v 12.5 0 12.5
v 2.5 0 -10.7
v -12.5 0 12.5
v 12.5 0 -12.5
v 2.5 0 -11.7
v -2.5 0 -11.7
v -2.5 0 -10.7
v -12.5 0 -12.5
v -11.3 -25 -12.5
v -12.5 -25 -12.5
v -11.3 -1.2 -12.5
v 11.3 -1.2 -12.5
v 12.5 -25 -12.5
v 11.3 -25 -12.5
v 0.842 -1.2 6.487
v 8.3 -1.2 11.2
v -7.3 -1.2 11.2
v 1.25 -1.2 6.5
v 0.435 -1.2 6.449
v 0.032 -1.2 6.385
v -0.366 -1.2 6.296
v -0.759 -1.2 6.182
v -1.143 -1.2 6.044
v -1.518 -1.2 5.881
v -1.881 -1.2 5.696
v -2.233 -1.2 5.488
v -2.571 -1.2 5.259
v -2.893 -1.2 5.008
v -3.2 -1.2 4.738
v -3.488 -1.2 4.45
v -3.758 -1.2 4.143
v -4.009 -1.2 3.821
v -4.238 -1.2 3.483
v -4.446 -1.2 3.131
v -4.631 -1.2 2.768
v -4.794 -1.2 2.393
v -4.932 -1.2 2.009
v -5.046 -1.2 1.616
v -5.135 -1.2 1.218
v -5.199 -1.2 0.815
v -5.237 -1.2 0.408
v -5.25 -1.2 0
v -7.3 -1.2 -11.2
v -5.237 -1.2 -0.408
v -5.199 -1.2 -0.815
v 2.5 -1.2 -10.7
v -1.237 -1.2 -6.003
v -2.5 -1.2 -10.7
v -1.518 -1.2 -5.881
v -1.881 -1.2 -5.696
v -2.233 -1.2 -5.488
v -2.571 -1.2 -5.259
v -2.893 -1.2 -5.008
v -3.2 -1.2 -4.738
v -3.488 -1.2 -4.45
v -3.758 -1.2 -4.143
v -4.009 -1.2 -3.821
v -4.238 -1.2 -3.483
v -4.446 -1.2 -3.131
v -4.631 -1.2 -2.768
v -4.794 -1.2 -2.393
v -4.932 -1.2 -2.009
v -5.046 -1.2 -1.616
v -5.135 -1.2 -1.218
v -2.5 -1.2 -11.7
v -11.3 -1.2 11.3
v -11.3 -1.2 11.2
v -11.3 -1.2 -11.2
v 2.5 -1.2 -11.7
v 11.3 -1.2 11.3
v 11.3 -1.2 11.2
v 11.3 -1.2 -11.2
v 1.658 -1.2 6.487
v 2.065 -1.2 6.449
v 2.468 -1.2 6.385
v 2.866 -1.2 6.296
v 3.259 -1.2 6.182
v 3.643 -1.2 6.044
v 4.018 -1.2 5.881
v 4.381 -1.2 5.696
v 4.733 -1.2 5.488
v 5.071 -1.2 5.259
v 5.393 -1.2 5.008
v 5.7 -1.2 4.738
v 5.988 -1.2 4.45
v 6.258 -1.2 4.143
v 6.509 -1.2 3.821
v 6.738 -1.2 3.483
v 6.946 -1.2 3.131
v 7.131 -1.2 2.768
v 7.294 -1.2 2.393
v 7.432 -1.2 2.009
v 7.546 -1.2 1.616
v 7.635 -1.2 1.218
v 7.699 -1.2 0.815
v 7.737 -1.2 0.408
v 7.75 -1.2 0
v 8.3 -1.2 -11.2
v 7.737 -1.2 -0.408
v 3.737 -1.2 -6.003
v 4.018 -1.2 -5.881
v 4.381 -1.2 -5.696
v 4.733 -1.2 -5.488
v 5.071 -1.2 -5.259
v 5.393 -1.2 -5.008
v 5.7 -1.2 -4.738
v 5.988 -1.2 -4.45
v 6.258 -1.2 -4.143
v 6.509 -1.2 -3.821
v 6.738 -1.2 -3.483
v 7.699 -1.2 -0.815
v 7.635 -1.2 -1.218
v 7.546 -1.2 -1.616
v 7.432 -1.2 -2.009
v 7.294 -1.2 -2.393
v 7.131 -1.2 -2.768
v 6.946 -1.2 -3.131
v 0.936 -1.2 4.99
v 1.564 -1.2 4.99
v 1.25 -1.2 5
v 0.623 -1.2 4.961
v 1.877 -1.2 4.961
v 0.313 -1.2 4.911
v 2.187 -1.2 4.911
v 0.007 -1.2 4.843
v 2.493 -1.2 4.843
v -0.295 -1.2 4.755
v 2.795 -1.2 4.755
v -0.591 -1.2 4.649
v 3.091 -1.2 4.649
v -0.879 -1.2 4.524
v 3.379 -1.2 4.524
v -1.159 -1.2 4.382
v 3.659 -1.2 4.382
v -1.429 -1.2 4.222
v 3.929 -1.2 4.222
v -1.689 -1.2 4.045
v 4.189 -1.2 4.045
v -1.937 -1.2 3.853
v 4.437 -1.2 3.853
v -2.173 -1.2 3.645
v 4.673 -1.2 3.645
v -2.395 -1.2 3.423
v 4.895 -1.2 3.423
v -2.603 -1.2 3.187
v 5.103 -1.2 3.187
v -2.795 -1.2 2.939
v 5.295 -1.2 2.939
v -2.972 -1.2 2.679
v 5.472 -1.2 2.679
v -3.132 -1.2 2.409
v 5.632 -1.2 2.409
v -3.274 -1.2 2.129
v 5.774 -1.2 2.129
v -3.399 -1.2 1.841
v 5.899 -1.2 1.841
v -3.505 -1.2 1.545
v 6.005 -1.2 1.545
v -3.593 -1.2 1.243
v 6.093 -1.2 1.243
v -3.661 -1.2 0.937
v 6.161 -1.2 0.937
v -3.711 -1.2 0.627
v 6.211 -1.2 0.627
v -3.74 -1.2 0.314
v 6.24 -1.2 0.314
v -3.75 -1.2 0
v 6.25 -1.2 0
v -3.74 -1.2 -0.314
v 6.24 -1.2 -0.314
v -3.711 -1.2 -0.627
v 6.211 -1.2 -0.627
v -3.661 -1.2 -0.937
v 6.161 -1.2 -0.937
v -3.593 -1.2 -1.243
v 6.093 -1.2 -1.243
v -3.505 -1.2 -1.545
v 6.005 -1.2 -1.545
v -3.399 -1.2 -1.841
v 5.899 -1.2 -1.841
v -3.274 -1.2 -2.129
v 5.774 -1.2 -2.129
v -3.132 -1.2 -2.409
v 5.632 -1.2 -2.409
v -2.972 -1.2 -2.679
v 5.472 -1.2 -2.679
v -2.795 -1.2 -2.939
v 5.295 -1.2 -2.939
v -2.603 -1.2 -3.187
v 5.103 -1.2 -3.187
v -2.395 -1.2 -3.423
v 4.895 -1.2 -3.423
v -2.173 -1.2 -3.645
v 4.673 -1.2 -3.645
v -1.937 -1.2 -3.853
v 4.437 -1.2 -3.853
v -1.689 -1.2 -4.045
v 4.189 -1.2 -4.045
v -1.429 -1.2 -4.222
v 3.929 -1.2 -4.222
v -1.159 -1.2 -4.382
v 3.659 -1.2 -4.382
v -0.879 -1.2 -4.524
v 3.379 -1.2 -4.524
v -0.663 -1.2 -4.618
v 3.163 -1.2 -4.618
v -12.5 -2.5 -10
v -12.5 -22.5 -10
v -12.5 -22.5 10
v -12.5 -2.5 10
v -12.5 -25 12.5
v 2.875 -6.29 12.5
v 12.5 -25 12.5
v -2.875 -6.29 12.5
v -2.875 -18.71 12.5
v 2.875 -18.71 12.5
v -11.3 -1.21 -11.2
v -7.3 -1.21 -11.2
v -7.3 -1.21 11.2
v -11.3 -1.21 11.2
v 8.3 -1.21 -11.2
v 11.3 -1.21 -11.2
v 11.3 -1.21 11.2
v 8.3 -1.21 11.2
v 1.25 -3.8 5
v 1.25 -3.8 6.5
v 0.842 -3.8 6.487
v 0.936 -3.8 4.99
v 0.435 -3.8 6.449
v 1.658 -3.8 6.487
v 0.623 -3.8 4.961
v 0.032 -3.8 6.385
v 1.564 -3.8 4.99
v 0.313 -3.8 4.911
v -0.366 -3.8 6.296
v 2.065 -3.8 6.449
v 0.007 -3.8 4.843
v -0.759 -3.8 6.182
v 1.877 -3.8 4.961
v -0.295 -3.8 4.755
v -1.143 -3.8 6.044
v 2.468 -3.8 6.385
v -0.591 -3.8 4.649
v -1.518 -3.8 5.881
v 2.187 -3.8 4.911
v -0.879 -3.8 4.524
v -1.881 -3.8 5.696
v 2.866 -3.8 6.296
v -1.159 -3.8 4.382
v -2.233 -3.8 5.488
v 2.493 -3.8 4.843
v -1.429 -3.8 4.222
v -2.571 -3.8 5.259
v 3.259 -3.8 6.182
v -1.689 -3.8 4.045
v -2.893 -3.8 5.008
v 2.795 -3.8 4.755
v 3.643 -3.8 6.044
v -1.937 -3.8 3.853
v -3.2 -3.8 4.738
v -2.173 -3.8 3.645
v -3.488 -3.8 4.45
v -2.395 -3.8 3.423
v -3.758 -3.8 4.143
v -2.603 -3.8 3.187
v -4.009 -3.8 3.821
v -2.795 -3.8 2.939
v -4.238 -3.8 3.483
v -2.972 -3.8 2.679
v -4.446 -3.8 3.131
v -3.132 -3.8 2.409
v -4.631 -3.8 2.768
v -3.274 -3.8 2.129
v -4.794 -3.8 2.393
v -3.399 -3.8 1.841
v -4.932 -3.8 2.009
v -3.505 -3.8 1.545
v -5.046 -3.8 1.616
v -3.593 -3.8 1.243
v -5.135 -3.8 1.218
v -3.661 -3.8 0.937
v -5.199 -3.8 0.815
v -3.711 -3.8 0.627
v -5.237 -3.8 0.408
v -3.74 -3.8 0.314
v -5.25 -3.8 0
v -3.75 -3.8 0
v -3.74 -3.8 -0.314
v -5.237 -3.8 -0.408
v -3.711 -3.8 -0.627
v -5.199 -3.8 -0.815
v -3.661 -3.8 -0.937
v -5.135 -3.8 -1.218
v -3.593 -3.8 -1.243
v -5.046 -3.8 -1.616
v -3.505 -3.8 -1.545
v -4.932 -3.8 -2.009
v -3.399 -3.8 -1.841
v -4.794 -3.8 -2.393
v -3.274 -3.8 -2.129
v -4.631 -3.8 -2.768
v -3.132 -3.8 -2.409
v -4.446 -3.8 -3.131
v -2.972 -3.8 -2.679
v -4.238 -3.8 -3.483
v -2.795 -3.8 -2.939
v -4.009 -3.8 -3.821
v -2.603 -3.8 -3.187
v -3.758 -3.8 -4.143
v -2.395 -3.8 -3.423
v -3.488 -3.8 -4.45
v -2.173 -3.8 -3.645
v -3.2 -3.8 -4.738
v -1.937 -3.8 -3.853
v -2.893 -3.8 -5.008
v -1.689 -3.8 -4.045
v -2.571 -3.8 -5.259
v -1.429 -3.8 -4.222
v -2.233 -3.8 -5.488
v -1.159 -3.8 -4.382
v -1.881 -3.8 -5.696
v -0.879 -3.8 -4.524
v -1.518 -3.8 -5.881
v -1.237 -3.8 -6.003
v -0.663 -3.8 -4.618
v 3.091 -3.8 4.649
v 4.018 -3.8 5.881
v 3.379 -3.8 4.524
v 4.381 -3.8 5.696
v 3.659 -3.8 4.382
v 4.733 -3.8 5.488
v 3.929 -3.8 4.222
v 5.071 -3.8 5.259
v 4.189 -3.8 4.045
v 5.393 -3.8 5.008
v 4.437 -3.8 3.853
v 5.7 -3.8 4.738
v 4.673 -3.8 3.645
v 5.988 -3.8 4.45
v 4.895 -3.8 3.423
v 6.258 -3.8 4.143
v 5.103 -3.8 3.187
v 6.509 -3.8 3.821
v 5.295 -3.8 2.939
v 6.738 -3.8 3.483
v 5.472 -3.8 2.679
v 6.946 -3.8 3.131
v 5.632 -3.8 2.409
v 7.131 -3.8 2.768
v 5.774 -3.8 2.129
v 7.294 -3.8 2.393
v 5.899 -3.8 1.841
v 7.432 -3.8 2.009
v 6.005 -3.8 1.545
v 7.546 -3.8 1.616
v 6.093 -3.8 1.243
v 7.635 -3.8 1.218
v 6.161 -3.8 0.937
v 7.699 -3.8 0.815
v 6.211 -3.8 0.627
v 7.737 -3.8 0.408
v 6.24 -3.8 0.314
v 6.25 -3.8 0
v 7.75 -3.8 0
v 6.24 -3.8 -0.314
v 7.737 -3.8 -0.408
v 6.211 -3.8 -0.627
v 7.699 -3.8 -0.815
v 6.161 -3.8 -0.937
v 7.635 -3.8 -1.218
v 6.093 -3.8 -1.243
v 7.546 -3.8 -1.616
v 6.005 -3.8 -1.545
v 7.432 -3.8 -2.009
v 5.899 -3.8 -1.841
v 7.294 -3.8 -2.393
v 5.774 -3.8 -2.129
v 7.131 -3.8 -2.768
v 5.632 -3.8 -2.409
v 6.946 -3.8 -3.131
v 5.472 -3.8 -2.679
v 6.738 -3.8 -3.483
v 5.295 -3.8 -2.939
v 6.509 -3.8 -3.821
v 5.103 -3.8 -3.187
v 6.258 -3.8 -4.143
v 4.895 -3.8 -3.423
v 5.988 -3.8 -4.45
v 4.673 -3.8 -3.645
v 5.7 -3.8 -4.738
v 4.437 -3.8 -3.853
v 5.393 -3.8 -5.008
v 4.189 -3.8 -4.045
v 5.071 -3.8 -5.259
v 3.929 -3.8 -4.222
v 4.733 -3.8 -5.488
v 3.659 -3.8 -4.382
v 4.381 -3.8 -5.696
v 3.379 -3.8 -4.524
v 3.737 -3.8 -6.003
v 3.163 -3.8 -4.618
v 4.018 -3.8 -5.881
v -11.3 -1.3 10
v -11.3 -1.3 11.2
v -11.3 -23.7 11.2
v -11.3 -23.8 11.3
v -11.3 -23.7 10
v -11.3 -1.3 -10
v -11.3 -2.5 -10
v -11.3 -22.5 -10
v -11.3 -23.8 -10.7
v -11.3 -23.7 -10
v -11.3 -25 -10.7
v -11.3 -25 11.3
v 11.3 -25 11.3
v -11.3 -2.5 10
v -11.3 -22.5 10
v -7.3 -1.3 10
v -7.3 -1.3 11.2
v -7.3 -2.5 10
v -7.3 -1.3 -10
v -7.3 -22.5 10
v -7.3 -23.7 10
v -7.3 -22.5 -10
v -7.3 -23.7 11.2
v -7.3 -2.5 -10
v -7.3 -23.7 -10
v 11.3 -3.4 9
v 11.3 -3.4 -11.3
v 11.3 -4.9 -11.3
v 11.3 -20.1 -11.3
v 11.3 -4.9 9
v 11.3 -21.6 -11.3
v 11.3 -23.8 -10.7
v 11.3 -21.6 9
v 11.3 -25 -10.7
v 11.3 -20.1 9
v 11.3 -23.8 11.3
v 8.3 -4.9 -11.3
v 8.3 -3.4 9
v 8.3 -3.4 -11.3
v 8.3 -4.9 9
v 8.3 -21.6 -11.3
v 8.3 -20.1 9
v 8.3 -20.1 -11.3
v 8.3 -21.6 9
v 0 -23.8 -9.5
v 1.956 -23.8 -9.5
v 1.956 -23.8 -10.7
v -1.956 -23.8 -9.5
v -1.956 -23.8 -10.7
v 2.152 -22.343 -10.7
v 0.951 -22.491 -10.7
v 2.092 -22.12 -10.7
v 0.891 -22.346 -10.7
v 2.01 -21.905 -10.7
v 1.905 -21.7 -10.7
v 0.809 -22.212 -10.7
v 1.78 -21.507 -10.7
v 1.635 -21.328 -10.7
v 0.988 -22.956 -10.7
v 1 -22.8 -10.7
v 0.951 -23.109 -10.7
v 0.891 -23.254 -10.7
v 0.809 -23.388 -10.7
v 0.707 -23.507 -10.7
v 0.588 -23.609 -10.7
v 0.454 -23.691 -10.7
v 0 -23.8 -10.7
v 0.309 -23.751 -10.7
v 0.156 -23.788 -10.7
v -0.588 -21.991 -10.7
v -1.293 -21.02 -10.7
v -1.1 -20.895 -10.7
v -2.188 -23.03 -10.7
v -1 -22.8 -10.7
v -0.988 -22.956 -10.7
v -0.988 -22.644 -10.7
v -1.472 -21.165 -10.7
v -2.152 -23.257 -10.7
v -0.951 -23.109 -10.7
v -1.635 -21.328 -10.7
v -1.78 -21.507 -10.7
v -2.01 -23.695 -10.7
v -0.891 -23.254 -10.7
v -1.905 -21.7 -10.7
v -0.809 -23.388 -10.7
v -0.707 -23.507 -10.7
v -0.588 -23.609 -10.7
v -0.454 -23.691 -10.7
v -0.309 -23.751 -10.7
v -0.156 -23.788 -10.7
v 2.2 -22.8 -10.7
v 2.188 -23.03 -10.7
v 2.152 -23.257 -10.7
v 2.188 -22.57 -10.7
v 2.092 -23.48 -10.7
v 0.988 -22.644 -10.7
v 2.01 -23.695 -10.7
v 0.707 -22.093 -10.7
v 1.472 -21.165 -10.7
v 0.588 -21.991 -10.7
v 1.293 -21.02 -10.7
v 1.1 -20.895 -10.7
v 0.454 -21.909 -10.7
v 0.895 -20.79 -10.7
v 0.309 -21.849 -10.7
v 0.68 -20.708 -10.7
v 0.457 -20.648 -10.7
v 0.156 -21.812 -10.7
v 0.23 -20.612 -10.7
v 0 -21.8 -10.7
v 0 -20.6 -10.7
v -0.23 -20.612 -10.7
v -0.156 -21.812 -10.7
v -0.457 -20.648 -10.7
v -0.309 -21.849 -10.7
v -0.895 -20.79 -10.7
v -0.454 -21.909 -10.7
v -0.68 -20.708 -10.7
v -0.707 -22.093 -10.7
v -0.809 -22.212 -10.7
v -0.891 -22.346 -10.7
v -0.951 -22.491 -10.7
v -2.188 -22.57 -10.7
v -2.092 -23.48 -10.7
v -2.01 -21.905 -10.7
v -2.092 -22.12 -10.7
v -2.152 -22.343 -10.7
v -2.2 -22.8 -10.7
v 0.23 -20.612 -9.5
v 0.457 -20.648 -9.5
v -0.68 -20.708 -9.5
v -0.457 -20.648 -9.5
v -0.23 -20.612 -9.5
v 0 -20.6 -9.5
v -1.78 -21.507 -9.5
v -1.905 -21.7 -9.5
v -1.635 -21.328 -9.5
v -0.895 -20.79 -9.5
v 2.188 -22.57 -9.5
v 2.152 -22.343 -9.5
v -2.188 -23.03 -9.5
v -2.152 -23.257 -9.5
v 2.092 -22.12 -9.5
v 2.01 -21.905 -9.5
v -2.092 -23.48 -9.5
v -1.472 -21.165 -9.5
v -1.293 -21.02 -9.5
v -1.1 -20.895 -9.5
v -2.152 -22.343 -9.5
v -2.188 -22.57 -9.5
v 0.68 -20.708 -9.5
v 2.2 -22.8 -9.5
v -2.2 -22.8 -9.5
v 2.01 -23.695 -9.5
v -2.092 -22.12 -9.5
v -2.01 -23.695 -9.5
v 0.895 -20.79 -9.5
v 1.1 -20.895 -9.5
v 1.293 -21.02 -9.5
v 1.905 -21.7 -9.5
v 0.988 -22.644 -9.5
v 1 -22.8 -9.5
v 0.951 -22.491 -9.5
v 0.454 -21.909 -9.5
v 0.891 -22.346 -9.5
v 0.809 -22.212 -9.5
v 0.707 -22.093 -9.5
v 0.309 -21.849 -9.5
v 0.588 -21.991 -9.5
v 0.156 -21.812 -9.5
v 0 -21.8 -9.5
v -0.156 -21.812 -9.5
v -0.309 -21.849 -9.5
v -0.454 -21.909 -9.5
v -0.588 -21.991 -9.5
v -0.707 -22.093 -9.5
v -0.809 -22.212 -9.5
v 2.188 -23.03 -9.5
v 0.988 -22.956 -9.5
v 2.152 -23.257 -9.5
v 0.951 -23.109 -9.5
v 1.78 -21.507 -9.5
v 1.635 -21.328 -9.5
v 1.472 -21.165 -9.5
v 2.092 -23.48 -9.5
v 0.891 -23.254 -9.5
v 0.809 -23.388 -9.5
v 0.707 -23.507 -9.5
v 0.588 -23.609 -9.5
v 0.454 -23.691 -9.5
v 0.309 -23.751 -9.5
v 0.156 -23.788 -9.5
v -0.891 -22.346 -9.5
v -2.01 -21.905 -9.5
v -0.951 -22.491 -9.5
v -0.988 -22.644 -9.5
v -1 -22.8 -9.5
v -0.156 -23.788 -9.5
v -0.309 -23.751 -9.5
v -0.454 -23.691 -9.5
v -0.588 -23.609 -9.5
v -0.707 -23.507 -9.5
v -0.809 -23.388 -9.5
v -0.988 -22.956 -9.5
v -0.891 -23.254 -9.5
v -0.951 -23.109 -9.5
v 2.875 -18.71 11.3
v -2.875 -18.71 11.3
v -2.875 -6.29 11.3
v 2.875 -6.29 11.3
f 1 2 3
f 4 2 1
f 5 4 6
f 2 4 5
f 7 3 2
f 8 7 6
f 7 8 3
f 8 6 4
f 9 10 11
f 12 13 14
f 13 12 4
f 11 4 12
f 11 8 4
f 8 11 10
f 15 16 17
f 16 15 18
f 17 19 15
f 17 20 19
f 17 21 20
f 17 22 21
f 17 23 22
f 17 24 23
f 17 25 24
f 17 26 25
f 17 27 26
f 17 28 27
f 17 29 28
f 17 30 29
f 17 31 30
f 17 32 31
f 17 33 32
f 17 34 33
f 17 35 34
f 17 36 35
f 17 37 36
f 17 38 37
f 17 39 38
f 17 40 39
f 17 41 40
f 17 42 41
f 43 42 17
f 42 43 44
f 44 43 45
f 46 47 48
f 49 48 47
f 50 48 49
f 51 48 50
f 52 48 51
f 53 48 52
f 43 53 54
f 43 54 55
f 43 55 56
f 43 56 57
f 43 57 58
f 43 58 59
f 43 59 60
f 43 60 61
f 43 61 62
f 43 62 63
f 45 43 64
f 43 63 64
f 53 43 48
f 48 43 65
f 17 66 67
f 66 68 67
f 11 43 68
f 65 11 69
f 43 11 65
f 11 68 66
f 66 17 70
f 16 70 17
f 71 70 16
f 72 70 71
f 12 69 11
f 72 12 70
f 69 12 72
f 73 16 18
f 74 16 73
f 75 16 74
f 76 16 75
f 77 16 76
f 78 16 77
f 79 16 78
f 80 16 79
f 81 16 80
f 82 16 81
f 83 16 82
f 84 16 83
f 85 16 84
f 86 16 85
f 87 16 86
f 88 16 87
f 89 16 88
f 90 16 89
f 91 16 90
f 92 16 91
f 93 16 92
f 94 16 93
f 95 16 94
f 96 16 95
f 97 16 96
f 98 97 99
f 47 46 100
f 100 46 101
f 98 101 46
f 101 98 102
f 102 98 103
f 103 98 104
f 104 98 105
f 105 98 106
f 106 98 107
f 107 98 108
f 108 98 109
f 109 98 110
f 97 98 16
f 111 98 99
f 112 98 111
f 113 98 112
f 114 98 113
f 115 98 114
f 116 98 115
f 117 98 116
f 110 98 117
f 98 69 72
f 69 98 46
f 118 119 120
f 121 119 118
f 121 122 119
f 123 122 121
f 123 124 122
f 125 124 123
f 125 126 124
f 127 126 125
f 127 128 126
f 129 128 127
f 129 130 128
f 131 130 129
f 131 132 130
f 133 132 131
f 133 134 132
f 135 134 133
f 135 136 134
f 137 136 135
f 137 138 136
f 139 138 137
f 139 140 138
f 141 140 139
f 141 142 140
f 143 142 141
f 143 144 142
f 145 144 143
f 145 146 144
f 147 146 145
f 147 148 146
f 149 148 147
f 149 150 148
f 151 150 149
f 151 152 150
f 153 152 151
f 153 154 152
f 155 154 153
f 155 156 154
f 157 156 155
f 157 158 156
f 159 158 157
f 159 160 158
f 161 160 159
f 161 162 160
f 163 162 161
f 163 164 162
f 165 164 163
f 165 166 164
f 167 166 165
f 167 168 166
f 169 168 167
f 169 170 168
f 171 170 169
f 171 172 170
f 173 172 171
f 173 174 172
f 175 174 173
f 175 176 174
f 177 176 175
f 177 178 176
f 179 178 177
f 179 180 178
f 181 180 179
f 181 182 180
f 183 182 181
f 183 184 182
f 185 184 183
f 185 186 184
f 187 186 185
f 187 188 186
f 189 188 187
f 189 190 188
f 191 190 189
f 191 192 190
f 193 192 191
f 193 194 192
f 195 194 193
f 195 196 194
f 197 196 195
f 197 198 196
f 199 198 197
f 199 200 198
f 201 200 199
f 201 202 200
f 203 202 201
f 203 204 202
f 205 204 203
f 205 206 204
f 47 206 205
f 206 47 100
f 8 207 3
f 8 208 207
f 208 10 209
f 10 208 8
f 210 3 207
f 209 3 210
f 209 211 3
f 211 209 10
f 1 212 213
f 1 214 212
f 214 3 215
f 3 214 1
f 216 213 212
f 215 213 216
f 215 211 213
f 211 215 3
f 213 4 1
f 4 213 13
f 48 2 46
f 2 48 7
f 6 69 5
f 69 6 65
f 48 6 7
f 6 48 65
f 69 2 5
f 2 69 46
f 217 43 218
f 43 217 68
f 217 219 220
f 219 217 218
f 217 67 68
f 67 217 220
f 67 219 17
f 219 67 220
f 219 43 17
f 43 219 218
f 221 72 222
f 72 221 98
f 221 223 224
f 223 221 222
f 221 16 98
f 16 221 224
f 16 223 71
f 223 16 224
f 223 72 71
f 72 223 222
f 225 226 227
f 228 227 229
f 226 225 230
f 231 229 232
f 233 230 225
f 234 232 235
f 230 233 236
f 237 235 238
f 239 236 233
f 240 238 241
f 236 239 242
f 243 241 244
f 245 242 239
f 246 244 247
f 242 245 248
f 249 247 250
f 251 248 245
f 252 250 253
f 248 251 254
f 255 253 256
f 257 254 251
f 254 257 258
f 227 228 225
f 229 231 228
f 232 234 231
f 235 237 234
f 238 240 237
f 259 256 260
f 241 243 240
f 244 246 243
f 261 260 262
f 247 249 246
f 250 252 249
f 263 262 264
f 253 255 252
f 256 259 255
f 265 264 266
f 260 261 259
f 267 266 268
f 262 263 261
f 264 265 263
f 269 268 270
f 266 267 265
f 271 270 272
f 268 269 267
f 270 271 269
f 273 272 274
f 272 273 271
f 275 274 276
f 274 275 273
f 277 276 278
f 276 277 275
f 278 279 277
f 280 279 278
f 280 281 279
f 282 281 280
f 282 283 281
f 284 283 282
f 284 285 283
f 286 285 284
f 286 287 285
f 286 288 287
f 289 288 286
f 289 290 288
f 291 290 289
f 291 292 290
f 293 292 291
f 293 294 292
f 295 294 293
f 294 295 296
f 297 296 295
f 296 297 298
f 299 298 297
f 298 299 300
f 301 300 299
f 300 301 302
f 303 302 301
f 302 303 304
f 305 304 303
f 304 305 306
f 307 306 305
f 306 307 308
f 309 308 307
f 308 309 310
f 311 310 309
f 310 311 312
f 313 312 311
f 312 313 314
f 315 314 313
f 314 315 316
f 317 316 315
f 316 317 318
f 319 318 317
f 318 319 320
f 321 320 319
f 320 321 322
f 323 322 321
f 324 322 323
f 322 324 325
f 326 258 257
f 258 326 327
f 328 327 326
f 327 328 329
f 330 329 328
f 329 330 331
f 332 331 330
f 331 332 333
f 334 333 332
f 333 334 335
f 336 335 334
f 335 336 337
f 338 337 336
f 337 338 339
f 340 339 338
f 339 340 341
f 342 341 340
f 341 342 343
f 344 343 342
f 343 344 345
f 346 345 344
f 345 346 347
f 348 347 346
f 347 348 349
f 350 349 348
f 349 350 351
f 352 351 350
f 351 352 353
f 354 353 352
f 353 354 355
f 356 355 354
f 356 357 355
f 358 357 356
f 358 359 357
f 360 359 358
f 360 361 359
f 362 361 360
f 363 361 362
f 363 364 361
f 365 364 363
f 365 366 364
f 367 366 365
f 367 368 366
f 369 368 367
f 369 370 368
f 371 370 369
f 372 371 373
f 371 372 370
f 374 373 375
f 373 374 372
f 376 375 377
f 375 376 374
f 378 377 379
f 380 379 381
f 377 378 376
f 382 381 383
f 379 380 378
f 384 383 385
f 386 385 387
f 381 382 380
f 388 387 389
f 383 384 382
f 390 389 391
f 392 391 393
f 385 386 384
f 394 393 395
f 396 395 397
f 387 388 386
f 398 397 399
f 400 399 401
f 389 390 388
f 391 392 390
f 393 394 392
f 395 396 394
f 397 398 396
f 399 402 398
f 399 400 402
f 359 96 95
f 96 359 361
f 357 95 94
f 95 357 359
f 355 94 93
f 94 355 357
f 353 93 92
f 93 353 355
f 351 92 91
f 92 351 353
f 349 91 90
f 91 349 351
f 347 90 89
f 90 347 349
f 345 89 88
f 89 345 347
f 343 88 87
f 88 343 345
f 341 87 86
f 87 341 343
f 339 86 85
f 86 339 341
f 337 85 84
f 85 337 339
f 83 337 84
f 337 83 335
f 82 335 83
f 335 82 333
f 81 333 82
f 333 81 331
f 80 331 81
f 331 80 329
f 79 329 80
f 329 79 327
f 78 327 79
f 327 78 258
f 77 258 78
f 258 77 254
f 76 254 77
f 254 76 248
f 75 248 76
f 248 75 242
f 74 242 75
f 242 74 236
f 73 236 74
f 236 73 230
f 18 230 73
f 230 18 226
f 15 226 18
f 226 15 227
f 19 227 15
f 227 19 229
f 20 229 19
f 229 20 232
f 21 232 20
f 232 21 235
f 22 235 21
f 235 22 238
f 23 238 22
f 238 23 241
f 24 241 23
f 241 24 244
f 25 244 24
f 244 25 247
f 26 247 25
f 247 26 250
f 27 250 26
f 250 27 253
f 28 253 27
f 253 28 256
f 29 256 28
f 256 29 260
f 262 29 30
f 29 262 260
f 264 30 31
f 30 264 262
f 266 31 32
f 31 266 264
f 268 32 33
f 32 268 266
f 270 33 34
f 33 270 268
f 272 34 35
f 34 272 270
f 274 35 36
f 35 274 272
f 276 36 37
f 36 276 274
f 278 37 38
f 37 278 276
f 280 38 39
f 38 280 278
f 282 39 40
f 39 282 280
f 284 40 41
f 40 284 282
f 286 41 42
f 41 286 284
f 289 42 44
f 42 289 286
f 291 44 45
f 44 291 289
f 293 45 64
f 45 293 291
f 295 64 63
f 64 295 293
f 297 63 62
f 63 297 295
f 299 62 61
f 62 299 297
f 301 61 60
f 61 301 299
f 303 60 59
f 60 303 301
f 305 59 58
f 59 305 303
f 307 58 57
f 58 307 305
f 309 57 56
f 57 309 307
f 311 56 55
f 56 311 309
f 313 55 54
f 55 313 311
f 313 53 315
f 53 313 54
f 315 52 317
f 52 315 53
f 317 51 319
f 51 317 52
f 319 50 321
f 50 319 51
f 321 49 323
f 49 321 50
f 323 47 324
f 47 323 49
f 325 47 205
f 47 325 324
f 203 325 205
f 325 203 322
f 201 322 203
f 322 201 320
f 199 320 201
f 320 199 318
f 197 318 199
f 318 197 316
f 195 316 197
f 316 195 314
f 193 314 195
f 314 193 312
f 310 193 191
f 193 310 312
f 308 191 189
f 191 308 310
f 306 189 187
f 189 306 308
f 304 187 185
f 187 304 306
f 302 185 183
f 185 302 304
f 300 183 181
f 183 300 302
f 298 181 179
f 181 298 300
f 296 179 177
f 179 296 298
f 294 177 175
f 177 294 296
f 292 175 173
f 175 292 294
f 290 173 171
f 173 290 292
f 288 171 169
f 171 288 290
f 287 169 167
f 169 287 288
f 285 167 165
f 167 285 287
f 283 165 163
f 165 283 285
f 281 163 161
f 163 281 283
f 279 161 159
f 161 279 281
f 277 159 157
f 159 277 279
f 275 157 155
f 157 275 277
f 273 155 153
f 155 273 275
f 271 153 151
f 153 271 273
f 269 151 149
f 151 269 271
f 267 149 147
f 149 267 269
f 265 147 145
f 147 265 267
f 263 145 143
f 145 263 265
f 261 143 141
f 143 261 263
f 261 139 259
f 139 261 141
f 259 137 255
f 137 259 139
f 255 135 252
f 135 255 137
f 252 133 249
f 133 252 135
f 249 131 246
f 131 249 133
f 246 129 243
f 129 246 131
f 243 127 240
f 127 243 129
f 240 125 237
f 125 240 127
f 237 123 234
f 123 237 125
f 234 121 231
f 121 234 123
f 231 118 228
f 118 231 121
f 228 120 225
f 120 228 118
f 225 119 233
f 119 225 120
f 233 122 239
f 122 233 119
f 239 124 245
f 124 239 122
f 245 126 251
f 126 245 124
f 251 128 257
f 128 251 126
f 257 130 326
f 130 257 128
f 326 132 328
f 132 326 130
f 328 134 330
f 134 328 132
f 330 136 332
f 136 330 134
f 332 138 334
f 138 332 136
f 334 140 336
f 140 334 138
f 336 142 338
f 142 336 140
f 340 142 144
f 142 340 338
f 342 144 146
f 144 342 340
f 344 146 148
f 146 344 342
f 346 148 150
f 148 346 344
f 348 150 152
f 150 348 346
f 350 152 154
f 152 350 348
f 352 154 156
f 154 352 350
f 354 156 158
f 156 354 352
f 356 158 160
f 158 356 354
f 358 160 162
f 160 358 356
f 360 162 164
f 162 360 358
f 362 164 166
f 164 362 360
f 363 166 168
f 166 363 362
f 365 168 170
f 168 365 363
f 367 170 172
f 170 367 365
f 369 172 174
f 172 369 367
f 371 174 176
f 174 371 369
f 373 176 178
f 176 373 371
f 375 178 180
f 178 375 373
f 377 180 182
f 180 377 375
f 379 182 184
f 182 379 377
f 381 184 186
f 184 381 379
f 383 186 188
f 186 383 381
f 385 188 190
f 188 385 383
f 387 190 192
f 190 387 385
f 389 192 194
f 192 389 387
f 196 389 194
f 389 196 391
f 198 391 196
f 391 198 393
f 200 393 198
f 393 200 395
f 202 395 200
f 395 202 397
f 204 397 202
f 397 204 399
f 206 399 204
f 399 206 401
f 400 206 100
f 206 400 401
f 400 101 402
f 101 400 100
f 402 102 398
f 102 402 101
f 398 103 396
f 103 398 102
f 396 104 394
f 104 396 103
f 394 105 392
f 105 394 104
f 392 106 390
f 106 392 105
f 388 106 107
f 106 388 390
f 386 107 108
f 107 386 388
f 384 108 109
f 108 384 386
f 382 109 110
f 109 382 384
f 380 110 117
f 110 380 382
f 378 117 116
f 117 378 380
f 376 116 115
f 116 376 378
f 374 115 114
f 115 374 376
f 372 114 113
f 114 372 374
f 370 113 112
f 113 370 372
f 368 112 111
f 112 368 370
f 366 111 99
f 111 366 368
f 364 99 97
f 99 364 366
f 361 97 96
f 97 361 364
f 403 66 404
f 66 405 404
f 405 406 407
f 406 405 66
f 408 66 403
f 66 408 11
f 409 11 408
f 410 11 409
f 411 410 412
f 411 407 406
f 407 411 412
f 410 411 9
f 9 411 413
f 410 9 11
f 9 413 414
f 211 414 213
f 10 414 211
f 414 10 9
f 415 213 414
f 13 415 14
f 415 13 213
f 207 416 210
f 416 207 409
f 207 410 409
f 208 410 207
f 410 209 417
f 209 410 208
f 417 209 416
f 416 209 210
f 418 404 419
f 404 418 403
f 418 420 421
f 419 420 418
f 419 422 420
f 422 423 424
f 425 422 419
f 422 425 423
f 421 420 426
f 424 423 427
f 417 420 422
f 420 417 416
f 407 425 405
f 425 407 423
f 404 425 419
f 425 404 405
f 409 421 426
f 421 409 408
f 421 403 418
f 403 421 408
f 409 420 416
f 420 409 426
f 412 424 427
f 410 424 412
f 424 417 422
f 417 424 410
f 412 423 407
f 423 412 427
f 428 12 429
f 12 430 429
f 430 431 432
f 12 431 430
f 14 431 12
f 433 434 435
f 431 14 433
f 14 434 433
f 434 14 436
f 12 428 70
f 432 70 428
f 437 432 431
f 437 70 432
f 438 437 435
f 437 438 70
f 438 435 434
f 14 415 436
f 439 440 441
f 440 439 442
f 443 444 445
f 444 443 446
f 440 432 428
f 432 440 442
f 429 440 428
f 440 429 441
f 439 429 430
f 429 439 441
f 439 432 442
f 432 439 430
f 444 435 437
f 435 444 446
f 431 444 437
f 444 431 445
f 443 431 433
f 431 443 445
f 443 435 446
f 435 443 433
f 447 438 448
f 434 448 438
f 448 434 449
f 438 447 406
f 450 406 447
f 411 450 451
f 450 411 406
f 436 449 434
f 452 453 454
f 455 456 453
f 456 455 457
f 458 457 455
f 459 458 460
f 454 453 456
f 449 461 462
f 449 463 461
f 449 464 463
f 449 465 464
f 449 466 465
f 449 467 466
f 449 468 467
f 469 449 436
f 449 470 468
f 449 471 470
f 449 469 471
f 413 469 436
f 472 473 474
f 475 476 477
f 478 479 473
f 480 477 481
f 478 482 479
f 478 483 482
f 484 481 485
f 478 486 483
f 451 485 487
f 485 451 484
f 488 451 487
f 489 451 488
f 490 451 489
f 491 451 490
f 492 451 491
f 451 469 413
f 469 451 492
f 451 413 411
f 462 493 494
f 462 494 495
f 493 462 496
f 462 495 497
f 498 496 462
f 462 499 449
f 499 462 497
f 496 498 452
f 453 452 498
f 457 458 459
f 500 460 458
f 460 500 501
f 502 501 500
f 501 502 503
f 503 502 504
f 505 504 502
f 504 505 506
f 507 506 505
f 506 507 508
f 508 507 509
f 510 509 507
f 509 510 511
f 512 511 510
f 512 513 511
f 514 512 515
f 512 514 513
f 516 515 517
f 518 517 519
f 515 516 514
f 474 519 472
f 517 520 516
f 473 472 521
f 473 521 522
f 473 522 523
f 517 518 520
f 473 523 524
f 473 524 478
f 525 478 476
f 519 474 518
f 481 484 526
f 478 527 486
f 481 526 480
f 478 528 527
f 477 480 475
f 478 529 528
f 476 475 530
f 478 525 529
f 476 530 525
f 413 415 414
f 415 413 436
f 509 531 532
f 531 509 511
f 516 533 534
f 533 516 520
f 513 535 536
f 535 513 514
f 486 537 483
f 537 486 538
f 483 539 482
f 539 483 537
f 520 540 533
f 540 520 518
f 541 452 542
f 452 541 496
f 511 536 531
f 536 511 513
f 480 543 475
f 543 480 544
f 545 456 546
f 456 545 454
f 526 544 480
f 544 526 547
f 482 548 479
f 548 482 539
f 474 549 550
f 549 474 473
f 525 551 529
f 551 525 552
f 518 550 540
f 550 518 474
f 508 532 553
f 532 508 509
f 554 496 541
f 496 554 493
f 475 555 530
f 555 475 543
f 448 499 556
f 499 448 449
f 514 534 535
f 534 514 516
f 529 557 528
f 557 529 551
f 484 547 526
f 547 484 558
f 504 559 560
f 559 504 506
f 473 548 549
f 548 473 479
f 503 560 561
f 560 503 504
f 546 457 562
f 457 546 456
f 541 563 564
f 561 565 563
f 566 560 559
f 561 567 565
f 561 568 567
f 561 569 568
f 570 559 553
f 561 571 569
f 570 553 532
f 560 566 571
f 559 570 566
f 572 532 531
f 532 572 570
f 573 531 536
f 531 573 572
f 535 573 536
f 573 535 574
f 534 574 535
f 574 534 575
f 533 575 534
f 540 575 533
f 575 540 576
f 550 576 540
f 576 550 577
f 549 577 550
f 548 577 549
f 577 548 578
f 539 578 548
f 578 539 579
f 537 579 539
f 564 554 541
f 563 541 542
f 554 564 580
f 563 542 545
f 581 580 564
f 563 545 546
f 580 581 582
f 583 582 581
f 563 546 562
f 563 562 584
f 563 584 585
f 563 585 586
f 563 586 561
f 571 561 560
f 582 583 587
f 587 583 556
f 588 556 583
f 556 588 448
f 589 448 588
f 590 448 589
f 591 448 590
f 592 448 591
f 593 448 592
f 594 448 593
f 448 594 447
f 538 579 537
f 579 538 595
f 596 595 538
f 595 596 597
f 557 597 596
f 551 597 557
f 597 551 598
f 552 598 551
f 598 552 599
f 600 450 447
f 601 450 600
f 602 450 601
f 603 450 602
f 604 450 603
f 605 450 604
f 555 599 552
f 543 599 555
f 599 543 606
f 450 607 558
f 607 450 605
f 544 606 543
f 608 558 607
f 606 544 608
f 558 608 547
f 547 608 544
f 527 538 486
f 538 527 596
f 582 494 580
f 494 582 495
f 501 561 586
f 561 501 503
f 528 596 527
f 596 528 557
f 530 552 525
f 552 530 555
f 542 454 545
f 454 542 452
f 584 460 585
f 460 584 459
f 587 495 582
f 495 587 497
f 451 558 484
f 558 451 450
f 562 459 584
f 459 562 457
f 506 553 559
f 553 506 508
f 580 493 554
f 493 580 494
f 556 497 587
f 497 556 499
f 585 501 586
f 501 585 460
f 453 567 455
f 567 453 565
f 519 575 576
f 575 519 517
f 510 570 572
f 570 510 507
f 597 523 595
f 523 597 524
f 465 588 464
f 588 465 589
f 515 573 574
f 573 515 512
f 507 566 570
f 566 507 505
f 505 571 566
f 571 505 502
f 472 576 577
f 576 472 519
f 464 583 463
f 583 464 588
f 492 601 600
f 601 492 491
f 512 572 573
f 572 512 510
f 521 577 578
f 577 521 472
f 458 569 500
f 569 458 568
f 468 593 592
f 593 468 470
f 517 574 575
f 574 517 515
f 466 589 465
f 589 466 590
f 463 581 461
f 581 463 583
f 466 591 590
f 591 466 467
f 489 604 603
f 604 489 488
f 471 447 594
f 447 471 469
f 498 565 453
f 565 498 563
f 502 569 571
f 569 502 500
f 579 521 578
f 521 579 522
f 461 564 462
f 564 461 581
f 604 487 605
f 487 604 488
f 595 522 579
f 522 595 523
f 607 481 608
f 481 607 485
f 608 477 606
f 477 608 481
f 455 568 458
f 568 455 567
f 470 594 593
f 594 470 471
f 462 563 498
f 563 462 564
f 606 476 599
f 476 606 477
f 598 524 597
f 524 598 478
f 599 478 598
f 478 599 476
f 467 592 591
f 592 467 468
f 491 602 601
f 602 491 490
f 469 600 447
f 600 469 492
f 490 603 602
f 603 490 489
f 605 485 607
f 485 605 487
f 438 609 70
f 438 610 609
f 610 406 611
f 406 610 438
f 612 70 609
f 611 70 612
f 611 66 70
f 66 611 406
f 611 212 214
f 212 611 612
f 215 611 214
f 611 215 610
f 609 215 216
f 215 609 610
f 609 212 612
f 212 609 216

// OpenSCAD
// ============================================================
// 하우징 조립 - ERM 면 + Peltier 면 + 오른쪽 면 + 모터 드라이버 면 + 윗면
// (클로저 하우징 제외 - housing_closure.scad 참고)
// ERM 면: 바닥 (XY 평면, world Z=0)
// Peltier 면: ERM 면의 +Y쪽 가장자리에서 수직으로 세움.
//   Peltier 면의 로컬 Y축(위<->아래) -> world Z축(위<->아래)
//   Peltier 면의 로컬 Z축(브라켓 돌출) -> world -Y축(하우징 안쪽으로 돌출)
// ============================================================

// ---------------- ERM 면 ----------------
module erm_face() {
    face_size      = 25;   // 면의 가로/세로 (정사각형)
    housing_t      = 1.2;  // 하우징 두께 (사방 테두리)
    border_gap     = 0.1;  // 테두리 안쪽 빈 공간 (Peltier 쪽 면과 동일한 규칙 적용)
    peltier_t      = 4;    // Peltier 고정 두께 (Z 깊이는 Peltier 면에서 결정)
    gap_1          = 2.05; // 빈 공간 (peltier_t 5.5->4 축소로 생긴 1.5mm를 ERM 링과 가까운 이 gap에 보충)
    erm_ring_t     = 1.5;  // ERM 고정 두께 (링 벽 두께)
    erm_hole_d     = 10;   // ERM 부품이 들어갈 원형 공간 지름
    gap_2          = 0.55; // 빈 공간 (ERM 링 두께 축소로 생긴 1mm 중 0.5mm 보충)
    motor_driver_t = 3;    // 모터 드라이버 고정 두께 (Z 깊이는 다른 면 설계 시 결정)

    erm_ring_z     = 2.6;  // ERM 고정 두께의 Z방향 깊이 (확정값)
    guide_h        = 0.01; // 참고용 2D 레이아웃 표시용 얇은 두께

    // --- Y축 경계 계산 (중심 원점, 위 -> 아래) ---
    y_top    = face_size / 2;
    y1 = y_top - housing_t;   // peltier 밴드 상단
    y2 = y1 - peltier_t;      // gap_1 상단
    y3 = y2 - gap_1;          // erm 링 위쪽 벽 상단
    y4 = y3 - erm_ring_t;     // erm 구멍 상단
    y5 = y4 - erm_hole_d;     // erm 구멍 하단 / 링 아래쪽 벽 상단
    y6 = y5 - erm_ring_t;     // gap_2 상단
    y7 = y6 - gap_2;          // 모터 드라이버 밴드 상단
    y8 = y7 - motor_driver_t; // 하우징 아래쪽 테두리 상단
    y_bottom = y8 - housing_t; // 검증용 (-face_size/2 와 같아야 함)

    erm_center_y = (y4 + y5) / 2;
    erm_inner_r  = erm_hole_d / 2;
    erm_outer_r  = erm_inner_r + erm_ring_t;

    frame_inner_w = face_size - 2 * housing_t;
    inner_w       = face_size - 2 * (housing_t + border_gap);

    echo("[ERM] y_bottom check =", y_bottom, " (should be", -face_size / 2, ")");
    echo("[ERM] ring center_y =", erm_center_y, " inner_r =", erm_inner_r, " outer_r =", erm_outer_r);

    // 하우징 바닥판 (면 전체, 실제 3D, 두께 1.2mm)
    // ERM 링이 뚫린 부분(9시 방향) 쪽, -X 가장자리에서 0.8mm 띄운 지점부터
    // (기존 0.2mm에서 ERM 링쪽으로 0.6mm 추가 이동)
    // 5mm(Y) x 1mm(X) 직사각형을 완전 관통(Z 1.2mm 전체). Y는 8.8mm씩 양쪽에서 띄워 중앙 정렬.
    color("gray")
        difference() {
            linear_extrude(height = housing_t)
                square([face_size, face_size], center = true);
            translate([-face_size / 2 + 0.8, -2.5, 0])
                cube([1, 5, housing_t]);
        }

    // 참고용 2D 레이아웃 (Z 깊이 미정 영역, 바닥판 위에 반투명 표시)
    color("orange", 0.3)
        translate([0, 0, housing_t])
            linear_extrude(height = guide_h)
                translate([0, y1 - peltier_t / 2])
                    square([inner_w, peltier_t], center = true);

    color("cyan", 0.3)
        translate([0, 0, housing_t])
            linear_extrude(height = guide_h)
                translate([0, y7 - motor_driver_t / 2])
                    square([inner_w, motor_driver_t], center = true);

    // ERM 링에서 잘라낼 구간: 9시 방향(180도) 기준 45도
    erm_gap_center_deg = 180;
    erm_gap_width_deg  = 45;
    erm_gap_r          = erm_outer_r + 1; // 확실히 잘리도록 여유

    // ERM 고정 링 (실제 3D, 바닥판 위에 Z 깊이 2.6mm 추가, 9시 방향 45도 절개)
    color("SteelBlue")
        translate([0, erm_center_y, housing_t])
            linear_extrude(height = erm_ring_z)
                difference() {
                    difference() {
                        circle(r = erm_outer_r, $fn = 100);
                        circle(r = erm_inner_r, $fn = 100);
                    }
                    polygon(points = [
                        [0, 0],
                        [erm_gap_r * cos(erm_gap_center_deg - erm_gap_width_deg / 2),
                         erm_gap_r * sin(erm_gap_center_deg - erm_gap_width_deg / 2)],
                        [erm_gap_r * cos(erm_gap_center_deg + erm_gap_width_deg / 2),
                         erm_gap_r * sin(erm_gap_center_deg + erm_gap_width_deg / 2)]
                    ]);
                }
}

// ---------------- Peltier 면 ----------------
module peltier_face() {
    face_size  = 25;   // 면의 가로/세로 (정사각형)
    housing_t  = 1.2;  // 하우징 두께 (사방 테두리)
    border_gap = 0.1;  // 테두리 안쪽 빈 공간 (X방향: 좌우 브라켓/연결부 폭 계산용)
    top_gap    = 1.3;  // 위쪽 테두리 - 브라켓 사이 Y방향 빈 공간 (bracket_h 1.2mm 축소분 보충: 0.1 -> 1.3)

    bracket_w  = 1.2;   // 세로 브라켓(Peltier 고정) 가로 두께
    bracket_h  = 20;    // 세로 브라켓(Peltier 고정) 세로 높이
    open_w     = 20;    // 브라켓 사이 뚫린 공간 가로 폭
    erm_link_h = 1.2;   // ERM 면과 연결되는 부분의 세로 두께 (브라켓과 바로 붙음)
    mid_gap    = 0.1;   // ERM 연결부 - 바깥 하우징 테두리 사이 빈 공간

    bracket_z  = 4;     // Peltier 고정 두께의 Z방향 깊이
    guide_h    = 0.01;  // 참고용 2D 레이아웃 표시용 얇은 두께

    frame_inner_w = face_size - 2 * housing_t;
    inner_w       = face_size - 2 * (housing_t + border_gap);

    // Y축 (위 -> 아래)
    y_top = face_size / 2;
    y1 = y_top - housing_t;
    y2 = y1 - top_gap;
    y3 = y2 - bracket_h;
    y4 = y3 - erm_link_h;
    y5 = y4 - mid_gap;
    y_bottom = y5 - housing_t;

    // X축 (왼쪽 -> 오른쪽)
    x_left = -face_size / 2;
    x1 = x_left + housing_t;
    x2 = x1 + border_gap;
    x3 = x2 + bracket_w;
    x4 = x3 + open_w;
    x5 = x4 + bracket_w;
    x_right_check = x5 + border_gap + housing_t;

    bracket_center_y = (y2 + y3) / 2;
    left_bracket_center_x  = (x2 + x3) / 2;
    right_bracket_center_x = (x4 + x5) / 2;

    echo("[Peltier] y_bottom check =", y_bottom, " (should be", -face_size / 2, ")");
    echo("[Peltier] x_right check =", x_right_check, " (should be", face_size / 2, ")");

    // 하우징 바닥판 (면 전체, 실제 3D, 두께 1.2mm)
    // 브라켓 자리(20mm x 20mm)를 관통 구멍으로 뚫음
    color("gray")
        difference() {
            linear_extrude(height = housing_t)
                square([face_size, face_size], center = true);
            translate([0, bracket_center_y, -0.1])
                linear_extrude(height = housing_t + 0.2)
                    square([open_w, bracket_h], center = true);
        }

    // ERM 연결부 (실제 3D, 바닥판 위에 Z 깊이 4mm 추가)
    color("green")
        translate([0, 0, housing_t])
            linear_extrude(height = bracket_z)
                translate([0, y3 - erm_link_h / 2])
                    square([inner_w, erm_link_h], center = true);

    // Peltier 고정 브라켓 (실제 3D, 바닥판 위에 Z 깊이 4mm 추가)
    color("SteelBlue")
        translate([0, 0, housing_t])
            linear_extrude(height = bracket_z) {
                translate([left_bracket_center_x, bracket_center_y])
                    square([bracket_w, bracket_h], center = true);
                translate([right_bracket_center_x, bracket_center_y])
                    square([bracket_w, bracket_h], center = true);
            }
}

// ---------------- 오른쪽(3시 방향) 면 ----------------
// 다른 부품 없이 1.2mm 두께 벽에 정가운데 직사각형 구멍만 있는 단순한 면.
module right_face() {
    face_size = 25;    // 면의 가로/세로 (정사각형, ERM/Peltier 면과 동일)
    housing_t = 1.2;   // 하우징 두께 (벽 두께)
    hole_w    = 12.42; // 정가운데 구멍 가로
    hole_h    = 5.75;  // 정가운데 구멍 세로

    color("gray")
        linear_extrude(height = housing_t)
            difference() {
                square([face_size, face_size], center = true);
                square([hole_w, hole_h], center = true);
            }
}

// ---------------- 모터 드라이버 쪽 면 ----------------
module motor_driver_face() {
    face_size = 25;   // 면의 가로/세로 (정사각형)
    housing_t = 1.2;  // 하우징 두께 (사방 테두리)

    gap_y     = 2.3;   // 위쪽 하우징 테두리 - 브라켓 사이 빈 공간
    bracket_h = 20.3;  // 세로 브라켓(모터 드라이버 고정) 세로 높이
    gap_x     = 2.2;   // 좌우 하우징 테두리 - 브라켓 사이 빈 공간
    bracket_w = 1.5;   // 세로 브라켓(모터 드라이버 고정) 가로 두께
    open_w    = 15.2;  // 브라켓 사이 뚫린 공간 가로 폭

    bracket_z = 3;     // 모터 드라이버 고정 두께의 Z방향 깊이 (ERM 면 스택의 3mm 재사용)

    // Y축 (위 -> 아래)
    y_top = face_size / 2;
    y1 = y_top - housing_t;
    y2 = y1 - gap_y;
    y3 = y2 - bracket_h;       // 브라켓 하단 = 아래쪽 테두리 상단 (ERM 연결)
    y_bottom = y3 - housing_t;

    // X축 (왼쪽 -> 오른쪽)
    x_left = -face_size / 2;
    x1 = x_left + housing_t;
    x2 = x1 + gap_x;
    x3 = x2 + bracket_w;
    x4 = x3 + open_w;
    x5 = x4 + bracket_w;
    x_right_check = x5 + gap_x + housing_t;

    bracket_center_y = (y2 + y3) / 2;
    left_bracket_center_x  = (x2 + x3) / 2;
    right_bracket_center_x = (x4 + x5) / 2;

    echo("[MotorDriver] y_bottom check =", y_bottom, " (should be", -face_size / 2, ")");
    echo("[MotorDriver] x_right check =", x_right_check, " (should be", face_size / 2, ")");

    // 하우징 바닥판 (면 전체, 실제 3D, 두께 1.2mm)
    color("gray")
        linear_extrude(height = housing_t)
            square([face_size, face_size], center = true);

    // 모터 드라이버 고정 브라켓 (실제 3D, 바닥판 위에 Z 깊이 3mm 추가)
    color("purple")
        translate([0, 0, housing_t])
            linear_extrude(height = bracket_z) {
                translate([left_bracket_center_x, bracket_center_y])
                    square([bracket_w, bracket_h], center = true);
                translate([right_bracket_center_x, bracket_center_y])
                    square([bracket_w, bracket_h], center = true);
            }
}

// ---------------- 윗면 ----------------
// 다른 부품 없이 1.2mm 두께 벽만 있는 단순한 면. 박스 맨 위(z=25)를 막음.
// 뚫린 면(-X쪽, 왼쪽) 방향으로 1.2mm 잘라내서 클로저 부품이 들어갈 자리를 남김.
// 클로저 하우징의 나사 구멍(윗면 안쪽 면 기준 Z로 1.2mm 아래)에 맞춰
// 지름 5mm 보스(가장자리에서 안쪽으로 1.5mm) 1개를 가운데에 붙이고, 나사 구멍은
// 클로저 구멍과 같은 방향(X축)으로 지름 2mm 관통.
module top_face() {
    face_size = 25;   // 면의 가로/세로 (정사각형)
    housing_t = 1.2;  // 하우징 두께 (벽 두께)

    boss_d      = 4.4;  // 나사 보스 지름
    boss_depth  = 1.2;  // 나사 보스의 X방향 두께
    boss_x0     = -face_size / 2 + housing_t; // 가장자리(뚫린 부분)에서 안쪽으로 1.2mm 들어간 원래 지점
    boss_shift  = 0.6;   // ERM 면의 직사각형 구멍과 동일하게 0.6mm 안쪽으로 이동
    boss_x      = boss_x0 + boss_shift;
    screw_d     = 2;    // 나사 구멍 지름
    boss_y      = 0;    // 가운데 정렬
    boss_z      = -1.0; // 보스 맨 위(Z) 좌표가 판재 맨 위(z=housing_t=1.2)와 같도록 설정 (-1.0+4.4/2=1.2)

    difference() {
        union() {
            // 판재 자체 길이를 보스 이동분(0.6mm)만큼 더 줄임 (뚫린 가장자리에서 housing_t+boss_shift만큼 후퇴)
            color("gray")
                linear_extrude(height = housing_t)
                    translate([-face_size / 2 + housing_t + boss_shift, -face_size / 2])
                        square([face_size - housing_t - boss_shift, face_size], center = false);

            // 나사 보스 1개 (0.6mm 이동한 지점부터 안쪽으로 1.5mm, 구멍 축은 X방향)
            color("gray")
                translate([boss_x, boss_y, boss_z])
                    rotate([0, 90, 0])
                        cylinder(d = boss_d, h = boss_depth, $fn = 60);
        }

        // 나사 구멍 (X방향 관통, 보스를 지나 벽까지)
        translate([boss_x - 0.1, boss_y, boss_z])
            rotate([0, 90, 0])
                cylinder(d = screw_d, h = boss_depth + housing_t + 0.2, $fn = 40);
    }
}

// ---------------- 조립 ----------------
// 전체를 X축 기준 180도 회전: 나사구멍이 있는 윗면(top_face)이 바닥(Z축 음의 방향)을 향하도록 뒤집음.
// (X축 회전이라 오른쪽/뚫린 면(-X, +X)은 그대로 있고, Peltier/모터드라이버(Y축 벽)만 서로 자리를 바꿈)
// 이어서 그 상태에서 오른쪽으로 90도 추가로 굴림 (Y축 기준 -90도 회전):
// 바닥(top_face) -> 오른쪽, 왼쪽(뚫린 면) -> 바닥, 위(ERM) -> 왼쪽, 오른쪽 면 -> 위
// 마지막으로 위에서 봤을 때 시계방향으로 90도 회전 (Z축 기준 -90도 회전)
rotate([0, 0, -90])
rotate([0, -90, 0])
rotate([180, 0, 0]) {
    erm_face();

    // Peltier 면을 ERM 면의 +Y쪽 가장자리(y=12.5)에 수직으로 세움 (위치는 그대로).
    // 면 안의 패턴(브라켓/연결부)만 왼쪽(반시계 방향)으로 90도 회전.
    // 로컬 Y -> world Z, 로컬 Z(브라켓 돌출) -> world -Y
    translate([0, 12.5, 12.5])
        rotate([90, 0, 0])
            rotate([0, 0, 90])
                peltier_face();

    // 오른쪽 면을 ERM 면의 +X쪽 가장자리(x=12.5)에 수직으로 세움.
    translate([12.5, 0, 12.5])
        rotate([0, -90, 0])
            right_face();

    // 모터 드라이버 면을 ERM 면의 -Y쪽 가장자리(y=-12.5)에 수직으로 세움.
    // Peltier 면과 같은 형태의 변환을 쓰고, world Z축 기준 180도 돌려서 반대쪽 가장자리에 배치.
    // 면 안의 패턴(브라켓)만 제자리에서 90도 회전.
    rotate([0, 0, 180])
        translate([0, 12.5, 12.5])
            rotate([90, 0, 0])
                rotate([0, 0, 90])
                    motor_driver_face();

    translate([0, 0, 25 - 1.2])
        top_face();
}
